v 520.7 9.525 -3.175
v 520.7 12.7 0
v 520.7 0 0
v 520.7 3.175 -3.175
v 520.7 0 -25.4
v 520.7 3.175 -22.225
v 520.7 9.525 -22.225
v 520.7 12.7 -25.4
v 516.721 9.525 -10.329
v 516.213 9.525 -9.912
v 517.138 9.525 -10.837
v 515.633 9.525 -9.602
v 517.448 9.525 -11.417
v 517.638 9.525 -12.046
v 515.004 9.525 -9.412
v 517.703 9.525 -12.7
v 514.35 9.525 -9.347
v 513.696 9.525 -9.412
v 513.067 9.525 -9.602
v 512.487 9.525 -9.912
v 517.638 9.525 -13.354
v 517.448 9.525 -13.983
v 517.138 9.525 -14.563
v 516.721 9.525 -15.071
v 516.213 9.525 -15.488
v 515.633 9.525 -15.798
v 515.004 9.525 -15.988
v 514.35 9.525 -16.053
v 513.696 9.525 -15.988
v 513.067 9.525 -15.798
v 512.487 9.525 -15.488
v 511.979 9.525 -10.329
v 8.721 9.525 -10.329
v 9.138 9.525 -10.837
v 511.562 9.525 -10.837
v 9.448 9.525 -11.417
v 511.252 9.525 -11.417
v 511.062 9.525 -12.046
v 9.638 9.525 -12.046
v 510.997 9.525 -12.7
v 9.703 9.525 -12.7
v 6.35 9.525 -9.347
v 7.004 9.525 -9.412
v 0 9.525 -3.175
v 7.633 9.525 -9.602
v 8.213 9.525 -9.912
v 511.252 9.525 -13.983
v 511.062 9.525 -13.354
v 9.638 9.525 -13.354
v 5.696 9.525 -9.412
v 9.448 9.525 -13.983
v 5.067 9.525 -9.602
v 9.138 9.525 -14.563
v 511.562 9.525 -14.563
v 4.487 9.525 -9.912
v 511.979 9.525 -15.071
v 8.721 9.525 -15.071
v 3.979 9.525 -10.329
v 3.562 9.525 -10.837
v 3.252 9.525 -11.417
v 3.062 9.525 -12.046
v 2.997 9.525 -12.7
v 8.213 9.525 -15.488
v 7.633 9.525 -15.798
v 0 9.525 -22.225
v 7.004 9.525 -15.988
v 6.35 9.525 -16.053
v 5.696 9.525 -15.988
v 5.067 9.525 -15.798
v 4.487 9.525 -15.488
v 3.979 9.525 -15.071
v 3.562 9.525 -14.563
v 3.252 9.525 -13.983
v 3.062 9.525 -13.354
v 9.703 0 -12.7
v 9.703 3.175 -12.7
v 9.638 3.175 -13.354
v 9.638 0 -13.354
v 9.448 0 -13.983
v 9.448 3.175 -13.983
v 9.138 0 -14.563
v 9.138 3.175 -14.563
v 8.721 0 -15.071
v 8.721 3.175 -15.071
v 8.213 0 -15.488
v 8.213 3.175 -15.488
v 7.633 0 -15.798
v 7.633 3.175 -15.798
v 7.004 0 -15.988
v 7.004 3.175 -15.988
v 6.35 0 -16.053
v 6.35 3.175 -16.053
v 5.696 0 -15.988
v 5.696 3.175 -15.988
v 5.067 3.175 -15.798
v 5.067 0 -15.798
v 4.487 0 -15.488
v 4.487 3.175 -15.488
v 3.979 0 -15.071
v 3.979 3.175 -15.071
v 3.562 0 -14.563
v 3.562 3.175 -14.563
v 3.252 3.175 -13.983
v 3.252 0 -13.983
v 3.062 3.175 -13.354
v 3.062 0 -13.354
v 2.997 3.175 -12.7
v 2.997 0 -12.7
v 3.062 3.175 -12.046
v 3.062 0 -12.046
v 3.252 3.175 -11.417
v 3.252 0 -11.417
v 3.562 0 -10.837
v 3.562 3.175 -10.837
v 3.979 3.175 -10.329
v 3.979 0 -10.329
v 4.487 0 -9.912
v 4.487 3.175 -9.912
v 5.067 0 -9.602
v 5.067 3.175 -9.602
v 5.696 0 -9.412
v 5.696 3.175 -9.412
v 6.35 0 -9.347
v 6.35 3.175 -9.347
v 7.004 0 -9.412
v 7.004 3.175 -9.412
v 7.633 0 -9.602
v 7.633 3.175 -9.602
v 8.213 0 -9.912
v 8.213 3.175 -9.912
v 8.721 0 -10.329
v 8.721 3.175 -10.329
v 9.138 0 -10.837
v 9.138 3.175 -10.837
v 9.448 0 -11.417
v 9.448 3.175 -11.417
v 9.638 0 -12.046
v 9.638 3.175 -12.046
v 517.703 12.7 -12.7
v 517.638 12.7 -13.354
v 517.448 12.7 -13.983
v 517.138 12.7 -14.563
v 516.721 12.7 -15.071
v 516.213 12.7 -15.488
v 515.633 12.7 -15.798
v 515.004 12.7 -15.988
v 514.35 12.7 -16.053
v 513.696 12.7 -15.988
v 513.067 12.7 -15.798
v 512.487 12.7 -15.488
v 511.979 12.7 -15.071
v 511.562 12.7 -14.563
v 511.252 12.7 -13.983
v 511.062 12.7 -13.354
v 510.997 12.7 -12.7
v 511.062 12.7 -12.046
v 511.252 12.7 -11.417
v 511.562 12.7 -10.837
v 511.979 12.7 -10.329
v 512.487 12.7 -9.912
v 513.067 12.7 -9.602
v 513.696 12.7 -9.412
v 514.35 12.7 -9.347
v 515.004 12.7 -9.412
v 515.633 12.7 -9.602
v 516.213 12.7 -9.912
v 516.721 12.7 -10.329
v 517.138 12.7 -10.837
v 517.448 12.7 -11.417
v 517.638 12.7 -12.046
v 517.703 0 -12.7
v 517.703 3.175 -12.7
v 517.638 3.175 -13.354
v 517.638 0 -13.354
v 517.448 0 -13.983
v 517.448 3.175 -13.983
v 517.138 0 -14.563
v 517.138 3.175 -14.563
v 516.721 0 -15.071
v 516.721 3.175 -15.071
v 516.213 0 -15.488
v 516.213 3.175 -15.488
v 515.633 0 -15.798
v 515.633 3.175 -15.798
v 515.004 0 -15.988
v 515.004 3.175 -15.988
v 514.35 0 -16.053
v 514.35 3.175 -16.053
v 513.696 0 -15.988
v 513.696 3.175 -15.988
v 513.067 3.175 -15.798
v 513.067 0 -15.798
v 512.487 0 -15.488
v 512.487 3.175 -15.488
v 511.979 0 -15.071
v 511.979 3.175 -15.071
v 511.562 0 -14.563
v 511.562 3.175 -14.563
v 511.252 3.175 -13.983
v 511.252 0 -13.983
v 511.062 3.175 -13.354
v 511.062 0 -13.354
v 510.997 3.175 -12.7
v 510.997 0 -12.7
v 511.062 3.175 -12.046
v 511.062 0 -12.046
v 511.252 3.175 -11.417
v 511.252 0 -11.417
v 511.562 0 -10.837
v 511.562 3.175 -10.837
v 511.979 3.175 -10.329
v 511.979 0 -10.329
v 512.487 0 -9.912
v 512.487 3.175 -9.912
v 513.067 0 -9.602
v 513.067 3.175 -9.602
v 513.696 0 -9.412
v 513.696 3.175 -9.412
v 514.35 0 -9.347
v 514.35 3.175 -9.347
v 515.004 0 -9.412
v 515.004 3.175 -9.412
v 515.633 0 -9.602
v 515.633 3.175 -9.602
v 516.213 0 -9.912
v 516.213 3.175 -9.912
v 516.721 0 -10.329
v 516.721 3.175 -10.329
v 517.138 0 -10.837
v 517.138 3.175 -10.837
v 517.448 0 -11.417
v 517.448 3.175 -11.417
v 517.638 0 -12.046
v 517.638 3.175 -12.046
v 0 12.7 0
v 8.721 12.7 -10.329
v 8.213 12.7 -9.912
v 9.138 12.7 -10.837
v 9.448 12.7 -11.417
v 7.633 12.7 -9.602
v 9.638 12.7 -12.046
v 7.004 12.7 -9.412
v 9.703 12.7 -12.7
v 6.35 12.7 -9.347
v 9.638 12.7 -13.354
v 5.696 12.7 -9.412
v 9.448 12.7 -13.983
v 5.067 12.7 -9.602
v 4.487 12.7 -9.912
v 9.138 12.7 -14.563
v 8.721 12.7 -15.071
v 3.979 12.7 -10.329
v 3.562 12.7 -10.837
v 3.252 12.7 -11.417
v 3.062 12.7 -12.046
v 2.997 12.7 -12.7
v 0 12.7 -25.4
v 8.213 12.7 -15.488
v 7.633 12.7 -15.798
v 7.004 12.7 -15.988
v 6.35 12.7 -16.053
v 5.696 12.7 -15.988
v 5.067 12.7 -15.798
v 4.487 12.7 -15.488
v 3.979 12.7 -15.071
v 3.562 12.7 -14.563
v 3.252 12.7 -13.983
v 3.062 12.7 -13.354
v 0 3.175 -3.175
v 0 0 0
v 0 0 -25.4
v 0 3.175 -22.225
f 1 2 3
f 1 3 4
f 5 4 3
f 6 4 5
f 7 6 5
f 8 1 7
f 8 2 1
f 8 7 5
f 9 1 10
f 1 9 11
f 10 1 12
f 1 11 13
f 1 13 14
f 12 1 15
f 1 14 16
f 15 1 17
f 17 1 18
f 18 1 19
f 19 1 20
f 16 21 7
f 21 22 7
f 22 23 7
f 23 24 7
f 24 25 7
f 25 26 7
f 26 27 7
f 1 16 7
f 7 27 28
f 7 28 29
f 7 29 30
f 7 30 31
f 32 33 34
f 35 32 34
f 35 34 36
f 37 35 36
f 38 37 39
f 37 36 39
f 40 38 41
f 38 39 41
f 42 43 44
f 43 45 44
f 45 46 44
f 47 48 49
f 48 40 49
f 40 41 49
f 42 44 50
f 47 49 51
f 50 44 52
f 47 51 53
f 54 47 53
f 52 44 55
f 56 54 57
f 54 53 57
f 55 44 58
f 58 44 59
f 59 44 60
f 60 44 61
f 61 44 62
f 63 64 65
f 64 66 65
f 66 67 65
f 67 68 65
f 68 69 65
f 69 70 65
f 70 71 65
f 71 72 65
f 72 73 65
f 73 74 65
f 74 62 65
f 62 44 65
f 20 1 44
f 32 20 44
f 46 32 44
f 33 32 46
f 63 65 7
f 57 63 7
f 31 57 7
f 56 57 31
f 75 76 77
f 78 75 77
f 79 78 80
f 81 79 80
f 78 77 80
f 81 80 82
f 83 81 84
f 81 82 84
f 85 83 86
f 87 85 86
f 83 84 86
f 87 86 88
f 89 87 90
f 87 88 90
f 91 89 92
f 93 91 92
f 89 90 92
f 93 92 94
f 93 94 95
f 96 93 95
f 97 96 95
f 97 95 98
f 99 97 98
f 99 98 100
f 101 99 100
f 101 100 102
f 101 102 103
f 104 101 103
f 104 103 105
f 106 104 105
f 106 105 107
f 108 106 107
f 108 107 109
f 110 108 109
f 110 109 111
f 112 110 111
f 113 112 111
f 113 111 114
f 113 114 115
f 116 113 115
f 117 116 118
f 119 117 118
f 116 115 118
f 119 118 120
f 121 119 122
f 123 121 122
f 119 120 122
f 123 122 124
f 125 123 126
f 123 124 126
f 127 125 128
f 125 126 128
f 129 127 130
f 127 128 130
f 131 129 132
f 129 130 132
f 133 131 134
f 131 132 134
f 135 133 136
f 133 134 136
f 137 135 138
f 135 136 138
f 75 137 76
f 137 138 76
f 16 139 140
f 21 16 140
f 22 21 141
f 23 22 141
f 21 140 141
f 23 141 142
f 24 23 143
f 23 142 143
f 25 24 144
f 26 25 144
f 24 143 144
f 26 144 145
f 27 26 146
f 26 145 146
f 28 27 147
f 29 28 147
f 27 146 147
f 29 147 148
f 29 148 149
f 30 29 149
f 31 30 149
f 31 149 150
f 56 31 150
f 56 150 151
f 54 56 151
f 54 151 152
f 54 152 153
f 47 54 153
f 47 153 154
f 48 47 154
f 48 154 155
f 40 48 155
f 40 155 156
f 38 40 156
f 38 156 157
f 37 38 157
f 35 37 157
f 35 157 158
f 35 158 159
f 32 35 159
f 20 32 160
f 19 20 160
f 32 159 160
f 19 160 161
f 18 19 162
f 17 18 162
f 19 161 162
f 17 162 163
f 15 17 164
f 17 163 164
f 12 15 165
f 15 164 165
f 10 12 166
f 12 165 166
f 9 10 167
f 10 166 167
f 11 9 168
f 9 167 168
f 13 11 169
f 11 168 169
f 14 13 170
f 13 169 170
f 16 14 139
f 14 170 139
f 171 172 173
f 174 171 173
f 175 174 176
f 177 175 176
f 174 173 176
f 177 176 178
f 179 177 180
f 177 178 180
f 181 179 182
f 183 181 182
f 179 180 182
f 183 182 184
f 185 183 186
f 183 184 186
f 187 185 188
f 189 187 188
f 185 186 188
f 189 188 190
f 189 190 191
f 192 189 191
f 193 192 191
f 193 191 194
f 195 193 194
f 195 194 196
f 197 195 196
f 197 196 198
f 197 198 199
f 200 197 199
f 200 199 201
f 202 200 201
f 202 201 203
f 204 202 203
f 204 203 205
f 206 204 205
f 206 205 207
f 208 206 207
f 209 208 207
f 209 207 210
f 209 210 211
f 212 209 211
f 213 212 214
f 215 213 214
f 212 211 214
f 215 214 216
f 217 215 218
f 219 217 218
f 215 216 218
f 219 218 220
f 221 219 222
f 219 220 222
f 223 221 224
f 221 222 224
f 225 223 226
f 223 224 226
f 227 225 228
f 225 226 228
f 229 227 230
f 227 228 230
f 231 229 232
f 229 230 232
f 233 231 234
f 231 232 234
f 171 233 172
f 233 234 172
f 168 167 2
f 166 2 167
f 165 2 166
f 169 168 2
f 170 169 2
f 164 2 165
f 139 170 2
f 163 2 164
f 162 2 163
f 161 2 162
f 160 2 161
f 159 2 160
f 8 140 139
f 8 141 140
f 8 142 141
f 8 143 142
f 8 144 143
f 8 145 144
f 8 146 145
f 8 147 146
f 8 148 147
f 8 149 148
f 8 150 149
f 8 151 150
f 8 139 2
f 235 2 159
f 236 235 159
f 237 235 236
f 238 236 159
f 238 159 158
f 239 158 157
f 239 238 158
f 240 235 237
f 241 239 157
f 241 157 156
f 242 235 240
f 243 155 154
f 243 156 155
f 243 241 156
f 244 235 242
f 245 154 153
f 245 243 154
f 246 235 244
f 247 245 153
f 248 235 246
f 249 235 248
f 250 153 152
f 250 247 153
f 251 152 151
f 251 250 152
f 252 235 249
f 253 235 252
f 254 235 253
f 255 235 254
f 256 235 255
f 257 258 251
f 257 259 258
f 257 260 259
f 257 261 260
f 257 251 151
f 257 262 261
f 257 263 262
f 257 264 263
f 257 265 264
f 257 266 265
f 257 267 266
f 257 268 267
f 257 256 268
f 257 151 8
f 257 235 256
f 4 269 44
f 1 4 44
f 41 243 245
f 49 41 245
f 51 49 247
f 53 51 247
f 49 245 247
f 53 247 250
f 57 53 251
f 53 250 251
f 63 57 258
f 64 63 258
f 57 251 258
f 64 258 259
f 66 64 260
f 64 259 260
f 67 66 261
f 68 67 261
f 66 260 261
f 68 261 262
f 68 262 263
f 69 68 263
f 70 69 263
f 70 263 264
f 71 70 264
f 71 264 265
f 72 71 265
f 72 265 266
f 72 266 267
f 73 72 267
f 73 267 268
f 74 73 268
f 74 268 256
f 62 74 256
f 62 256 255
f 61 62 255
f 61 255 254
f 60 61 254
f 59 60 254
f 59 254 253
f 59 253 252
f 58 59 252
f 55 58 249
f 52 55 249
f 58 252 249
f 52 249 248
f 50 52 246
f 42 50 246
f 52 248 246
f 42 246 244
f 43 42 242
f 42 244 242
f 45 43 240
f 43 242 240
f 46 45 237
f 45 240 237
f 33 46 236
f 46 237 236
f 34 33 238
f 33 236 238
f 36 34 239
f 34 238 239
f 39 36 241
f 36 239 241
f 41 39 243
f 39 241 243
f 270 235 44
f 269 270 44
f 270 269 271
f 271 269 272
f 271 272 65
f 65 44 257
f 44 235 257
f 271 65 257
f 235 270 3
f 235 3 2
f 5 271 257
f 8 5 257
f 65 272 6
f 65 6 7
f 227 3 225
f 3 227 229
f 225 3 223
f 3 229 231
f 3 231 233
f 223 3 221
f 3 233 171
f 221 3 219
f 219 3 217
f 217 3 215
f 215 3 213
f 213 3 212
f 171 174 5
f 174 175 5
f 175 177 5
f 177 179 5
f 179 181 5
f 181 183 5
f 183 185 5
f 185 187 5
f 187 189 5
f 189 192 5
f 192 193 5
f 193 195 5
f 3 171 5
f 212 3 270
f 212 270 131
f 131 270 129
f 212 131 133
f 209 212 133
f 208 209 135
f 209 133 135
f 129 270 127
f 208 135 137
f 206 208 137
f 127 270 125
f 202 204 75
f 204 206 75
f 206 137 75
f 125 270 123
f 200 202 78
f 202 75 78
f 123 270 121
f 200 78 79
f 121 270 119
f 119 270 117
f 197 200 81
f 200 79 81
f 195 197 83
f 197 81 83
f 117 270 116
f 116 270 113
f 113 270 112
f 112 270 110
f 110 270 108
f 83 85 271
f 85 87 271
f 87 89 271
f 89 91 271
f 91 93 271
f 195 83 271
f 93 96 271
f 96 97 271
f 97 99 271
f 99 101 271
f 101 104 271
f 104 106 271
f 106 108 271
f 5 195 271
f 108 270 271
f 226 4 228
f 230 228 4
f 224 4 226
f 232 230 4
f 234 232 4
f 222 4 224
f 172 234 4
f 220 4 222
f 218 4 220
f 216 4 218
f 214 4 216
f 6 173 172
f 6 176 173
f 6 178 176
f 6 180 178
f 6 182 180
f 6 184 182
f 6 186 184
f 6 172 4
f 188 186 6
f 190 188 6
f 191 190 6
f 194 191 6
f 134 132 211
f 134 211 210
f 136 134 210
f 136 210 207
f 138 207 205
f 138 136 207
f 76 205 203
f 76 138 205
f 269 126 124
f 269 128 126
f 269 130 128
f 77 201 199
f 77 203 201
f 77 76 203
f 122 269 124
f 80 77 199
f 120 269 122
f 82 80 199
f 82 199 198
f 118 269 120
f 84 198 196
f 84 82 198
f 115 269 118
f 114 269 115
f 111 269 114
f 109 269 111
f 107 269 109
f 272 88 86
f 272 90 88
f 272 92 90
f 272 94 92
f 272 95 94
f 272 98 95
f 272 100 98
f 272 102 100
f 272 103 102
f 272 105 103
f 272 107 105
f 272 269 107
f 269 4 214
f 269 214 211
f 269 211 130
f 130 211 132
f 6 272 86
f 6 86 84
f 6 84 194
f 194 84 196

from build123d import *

# Parameters (mm, degrees)
SKETCH1_W           = 25.4
SKETCH1_H           = 12.7
SKETCH1_W_2         = 19.05
SKETCH1_H_2         = 6.35
BOSS_EXTRUDE1_DEPTH = 520.7
SKETCH2_R           = 3.3528
CUT_EXTRUDE1_DEPTH  = 13.7


with BuildPart() as part:
    # Sketch1 → Boss-Extrude1 (new body)
    with BuildSketch(Plane(origin=(0, 0, 0), x_dir=(0, 0, -1), z_dir=(1, 0, 0))):
        with Locations((12.7, 6.35)):
            Rectangle(SKETCH1_W, SKETCH1_H)
        with Locations((12.7, 6.35)):
            Rectangle(SKETCH1_W_2, SKETCH1_H_2, mode=Mode.SUBTRACT)
    extrude(amount=BOSS_EXTRUDE1_DEPTH)

    # Sketch2 → Cut-Extrude1 (cut, through all)
    with BuildSketch(Plane(origin=(0, 12.7, 0), x_dir=(1, 0, 0), z_dir=(0, 1, 0))):
        with Locations((6.35, 12.7)):
            Circle(SKETCH2_R)
        with Locations((514.35, 12.7)):
            Circle(SKETCH2_R)
    extrude(amount=-CUT_EXTRUDE1_DEPTH, mode=Mode.SUBTRACT)


solid = part.part
